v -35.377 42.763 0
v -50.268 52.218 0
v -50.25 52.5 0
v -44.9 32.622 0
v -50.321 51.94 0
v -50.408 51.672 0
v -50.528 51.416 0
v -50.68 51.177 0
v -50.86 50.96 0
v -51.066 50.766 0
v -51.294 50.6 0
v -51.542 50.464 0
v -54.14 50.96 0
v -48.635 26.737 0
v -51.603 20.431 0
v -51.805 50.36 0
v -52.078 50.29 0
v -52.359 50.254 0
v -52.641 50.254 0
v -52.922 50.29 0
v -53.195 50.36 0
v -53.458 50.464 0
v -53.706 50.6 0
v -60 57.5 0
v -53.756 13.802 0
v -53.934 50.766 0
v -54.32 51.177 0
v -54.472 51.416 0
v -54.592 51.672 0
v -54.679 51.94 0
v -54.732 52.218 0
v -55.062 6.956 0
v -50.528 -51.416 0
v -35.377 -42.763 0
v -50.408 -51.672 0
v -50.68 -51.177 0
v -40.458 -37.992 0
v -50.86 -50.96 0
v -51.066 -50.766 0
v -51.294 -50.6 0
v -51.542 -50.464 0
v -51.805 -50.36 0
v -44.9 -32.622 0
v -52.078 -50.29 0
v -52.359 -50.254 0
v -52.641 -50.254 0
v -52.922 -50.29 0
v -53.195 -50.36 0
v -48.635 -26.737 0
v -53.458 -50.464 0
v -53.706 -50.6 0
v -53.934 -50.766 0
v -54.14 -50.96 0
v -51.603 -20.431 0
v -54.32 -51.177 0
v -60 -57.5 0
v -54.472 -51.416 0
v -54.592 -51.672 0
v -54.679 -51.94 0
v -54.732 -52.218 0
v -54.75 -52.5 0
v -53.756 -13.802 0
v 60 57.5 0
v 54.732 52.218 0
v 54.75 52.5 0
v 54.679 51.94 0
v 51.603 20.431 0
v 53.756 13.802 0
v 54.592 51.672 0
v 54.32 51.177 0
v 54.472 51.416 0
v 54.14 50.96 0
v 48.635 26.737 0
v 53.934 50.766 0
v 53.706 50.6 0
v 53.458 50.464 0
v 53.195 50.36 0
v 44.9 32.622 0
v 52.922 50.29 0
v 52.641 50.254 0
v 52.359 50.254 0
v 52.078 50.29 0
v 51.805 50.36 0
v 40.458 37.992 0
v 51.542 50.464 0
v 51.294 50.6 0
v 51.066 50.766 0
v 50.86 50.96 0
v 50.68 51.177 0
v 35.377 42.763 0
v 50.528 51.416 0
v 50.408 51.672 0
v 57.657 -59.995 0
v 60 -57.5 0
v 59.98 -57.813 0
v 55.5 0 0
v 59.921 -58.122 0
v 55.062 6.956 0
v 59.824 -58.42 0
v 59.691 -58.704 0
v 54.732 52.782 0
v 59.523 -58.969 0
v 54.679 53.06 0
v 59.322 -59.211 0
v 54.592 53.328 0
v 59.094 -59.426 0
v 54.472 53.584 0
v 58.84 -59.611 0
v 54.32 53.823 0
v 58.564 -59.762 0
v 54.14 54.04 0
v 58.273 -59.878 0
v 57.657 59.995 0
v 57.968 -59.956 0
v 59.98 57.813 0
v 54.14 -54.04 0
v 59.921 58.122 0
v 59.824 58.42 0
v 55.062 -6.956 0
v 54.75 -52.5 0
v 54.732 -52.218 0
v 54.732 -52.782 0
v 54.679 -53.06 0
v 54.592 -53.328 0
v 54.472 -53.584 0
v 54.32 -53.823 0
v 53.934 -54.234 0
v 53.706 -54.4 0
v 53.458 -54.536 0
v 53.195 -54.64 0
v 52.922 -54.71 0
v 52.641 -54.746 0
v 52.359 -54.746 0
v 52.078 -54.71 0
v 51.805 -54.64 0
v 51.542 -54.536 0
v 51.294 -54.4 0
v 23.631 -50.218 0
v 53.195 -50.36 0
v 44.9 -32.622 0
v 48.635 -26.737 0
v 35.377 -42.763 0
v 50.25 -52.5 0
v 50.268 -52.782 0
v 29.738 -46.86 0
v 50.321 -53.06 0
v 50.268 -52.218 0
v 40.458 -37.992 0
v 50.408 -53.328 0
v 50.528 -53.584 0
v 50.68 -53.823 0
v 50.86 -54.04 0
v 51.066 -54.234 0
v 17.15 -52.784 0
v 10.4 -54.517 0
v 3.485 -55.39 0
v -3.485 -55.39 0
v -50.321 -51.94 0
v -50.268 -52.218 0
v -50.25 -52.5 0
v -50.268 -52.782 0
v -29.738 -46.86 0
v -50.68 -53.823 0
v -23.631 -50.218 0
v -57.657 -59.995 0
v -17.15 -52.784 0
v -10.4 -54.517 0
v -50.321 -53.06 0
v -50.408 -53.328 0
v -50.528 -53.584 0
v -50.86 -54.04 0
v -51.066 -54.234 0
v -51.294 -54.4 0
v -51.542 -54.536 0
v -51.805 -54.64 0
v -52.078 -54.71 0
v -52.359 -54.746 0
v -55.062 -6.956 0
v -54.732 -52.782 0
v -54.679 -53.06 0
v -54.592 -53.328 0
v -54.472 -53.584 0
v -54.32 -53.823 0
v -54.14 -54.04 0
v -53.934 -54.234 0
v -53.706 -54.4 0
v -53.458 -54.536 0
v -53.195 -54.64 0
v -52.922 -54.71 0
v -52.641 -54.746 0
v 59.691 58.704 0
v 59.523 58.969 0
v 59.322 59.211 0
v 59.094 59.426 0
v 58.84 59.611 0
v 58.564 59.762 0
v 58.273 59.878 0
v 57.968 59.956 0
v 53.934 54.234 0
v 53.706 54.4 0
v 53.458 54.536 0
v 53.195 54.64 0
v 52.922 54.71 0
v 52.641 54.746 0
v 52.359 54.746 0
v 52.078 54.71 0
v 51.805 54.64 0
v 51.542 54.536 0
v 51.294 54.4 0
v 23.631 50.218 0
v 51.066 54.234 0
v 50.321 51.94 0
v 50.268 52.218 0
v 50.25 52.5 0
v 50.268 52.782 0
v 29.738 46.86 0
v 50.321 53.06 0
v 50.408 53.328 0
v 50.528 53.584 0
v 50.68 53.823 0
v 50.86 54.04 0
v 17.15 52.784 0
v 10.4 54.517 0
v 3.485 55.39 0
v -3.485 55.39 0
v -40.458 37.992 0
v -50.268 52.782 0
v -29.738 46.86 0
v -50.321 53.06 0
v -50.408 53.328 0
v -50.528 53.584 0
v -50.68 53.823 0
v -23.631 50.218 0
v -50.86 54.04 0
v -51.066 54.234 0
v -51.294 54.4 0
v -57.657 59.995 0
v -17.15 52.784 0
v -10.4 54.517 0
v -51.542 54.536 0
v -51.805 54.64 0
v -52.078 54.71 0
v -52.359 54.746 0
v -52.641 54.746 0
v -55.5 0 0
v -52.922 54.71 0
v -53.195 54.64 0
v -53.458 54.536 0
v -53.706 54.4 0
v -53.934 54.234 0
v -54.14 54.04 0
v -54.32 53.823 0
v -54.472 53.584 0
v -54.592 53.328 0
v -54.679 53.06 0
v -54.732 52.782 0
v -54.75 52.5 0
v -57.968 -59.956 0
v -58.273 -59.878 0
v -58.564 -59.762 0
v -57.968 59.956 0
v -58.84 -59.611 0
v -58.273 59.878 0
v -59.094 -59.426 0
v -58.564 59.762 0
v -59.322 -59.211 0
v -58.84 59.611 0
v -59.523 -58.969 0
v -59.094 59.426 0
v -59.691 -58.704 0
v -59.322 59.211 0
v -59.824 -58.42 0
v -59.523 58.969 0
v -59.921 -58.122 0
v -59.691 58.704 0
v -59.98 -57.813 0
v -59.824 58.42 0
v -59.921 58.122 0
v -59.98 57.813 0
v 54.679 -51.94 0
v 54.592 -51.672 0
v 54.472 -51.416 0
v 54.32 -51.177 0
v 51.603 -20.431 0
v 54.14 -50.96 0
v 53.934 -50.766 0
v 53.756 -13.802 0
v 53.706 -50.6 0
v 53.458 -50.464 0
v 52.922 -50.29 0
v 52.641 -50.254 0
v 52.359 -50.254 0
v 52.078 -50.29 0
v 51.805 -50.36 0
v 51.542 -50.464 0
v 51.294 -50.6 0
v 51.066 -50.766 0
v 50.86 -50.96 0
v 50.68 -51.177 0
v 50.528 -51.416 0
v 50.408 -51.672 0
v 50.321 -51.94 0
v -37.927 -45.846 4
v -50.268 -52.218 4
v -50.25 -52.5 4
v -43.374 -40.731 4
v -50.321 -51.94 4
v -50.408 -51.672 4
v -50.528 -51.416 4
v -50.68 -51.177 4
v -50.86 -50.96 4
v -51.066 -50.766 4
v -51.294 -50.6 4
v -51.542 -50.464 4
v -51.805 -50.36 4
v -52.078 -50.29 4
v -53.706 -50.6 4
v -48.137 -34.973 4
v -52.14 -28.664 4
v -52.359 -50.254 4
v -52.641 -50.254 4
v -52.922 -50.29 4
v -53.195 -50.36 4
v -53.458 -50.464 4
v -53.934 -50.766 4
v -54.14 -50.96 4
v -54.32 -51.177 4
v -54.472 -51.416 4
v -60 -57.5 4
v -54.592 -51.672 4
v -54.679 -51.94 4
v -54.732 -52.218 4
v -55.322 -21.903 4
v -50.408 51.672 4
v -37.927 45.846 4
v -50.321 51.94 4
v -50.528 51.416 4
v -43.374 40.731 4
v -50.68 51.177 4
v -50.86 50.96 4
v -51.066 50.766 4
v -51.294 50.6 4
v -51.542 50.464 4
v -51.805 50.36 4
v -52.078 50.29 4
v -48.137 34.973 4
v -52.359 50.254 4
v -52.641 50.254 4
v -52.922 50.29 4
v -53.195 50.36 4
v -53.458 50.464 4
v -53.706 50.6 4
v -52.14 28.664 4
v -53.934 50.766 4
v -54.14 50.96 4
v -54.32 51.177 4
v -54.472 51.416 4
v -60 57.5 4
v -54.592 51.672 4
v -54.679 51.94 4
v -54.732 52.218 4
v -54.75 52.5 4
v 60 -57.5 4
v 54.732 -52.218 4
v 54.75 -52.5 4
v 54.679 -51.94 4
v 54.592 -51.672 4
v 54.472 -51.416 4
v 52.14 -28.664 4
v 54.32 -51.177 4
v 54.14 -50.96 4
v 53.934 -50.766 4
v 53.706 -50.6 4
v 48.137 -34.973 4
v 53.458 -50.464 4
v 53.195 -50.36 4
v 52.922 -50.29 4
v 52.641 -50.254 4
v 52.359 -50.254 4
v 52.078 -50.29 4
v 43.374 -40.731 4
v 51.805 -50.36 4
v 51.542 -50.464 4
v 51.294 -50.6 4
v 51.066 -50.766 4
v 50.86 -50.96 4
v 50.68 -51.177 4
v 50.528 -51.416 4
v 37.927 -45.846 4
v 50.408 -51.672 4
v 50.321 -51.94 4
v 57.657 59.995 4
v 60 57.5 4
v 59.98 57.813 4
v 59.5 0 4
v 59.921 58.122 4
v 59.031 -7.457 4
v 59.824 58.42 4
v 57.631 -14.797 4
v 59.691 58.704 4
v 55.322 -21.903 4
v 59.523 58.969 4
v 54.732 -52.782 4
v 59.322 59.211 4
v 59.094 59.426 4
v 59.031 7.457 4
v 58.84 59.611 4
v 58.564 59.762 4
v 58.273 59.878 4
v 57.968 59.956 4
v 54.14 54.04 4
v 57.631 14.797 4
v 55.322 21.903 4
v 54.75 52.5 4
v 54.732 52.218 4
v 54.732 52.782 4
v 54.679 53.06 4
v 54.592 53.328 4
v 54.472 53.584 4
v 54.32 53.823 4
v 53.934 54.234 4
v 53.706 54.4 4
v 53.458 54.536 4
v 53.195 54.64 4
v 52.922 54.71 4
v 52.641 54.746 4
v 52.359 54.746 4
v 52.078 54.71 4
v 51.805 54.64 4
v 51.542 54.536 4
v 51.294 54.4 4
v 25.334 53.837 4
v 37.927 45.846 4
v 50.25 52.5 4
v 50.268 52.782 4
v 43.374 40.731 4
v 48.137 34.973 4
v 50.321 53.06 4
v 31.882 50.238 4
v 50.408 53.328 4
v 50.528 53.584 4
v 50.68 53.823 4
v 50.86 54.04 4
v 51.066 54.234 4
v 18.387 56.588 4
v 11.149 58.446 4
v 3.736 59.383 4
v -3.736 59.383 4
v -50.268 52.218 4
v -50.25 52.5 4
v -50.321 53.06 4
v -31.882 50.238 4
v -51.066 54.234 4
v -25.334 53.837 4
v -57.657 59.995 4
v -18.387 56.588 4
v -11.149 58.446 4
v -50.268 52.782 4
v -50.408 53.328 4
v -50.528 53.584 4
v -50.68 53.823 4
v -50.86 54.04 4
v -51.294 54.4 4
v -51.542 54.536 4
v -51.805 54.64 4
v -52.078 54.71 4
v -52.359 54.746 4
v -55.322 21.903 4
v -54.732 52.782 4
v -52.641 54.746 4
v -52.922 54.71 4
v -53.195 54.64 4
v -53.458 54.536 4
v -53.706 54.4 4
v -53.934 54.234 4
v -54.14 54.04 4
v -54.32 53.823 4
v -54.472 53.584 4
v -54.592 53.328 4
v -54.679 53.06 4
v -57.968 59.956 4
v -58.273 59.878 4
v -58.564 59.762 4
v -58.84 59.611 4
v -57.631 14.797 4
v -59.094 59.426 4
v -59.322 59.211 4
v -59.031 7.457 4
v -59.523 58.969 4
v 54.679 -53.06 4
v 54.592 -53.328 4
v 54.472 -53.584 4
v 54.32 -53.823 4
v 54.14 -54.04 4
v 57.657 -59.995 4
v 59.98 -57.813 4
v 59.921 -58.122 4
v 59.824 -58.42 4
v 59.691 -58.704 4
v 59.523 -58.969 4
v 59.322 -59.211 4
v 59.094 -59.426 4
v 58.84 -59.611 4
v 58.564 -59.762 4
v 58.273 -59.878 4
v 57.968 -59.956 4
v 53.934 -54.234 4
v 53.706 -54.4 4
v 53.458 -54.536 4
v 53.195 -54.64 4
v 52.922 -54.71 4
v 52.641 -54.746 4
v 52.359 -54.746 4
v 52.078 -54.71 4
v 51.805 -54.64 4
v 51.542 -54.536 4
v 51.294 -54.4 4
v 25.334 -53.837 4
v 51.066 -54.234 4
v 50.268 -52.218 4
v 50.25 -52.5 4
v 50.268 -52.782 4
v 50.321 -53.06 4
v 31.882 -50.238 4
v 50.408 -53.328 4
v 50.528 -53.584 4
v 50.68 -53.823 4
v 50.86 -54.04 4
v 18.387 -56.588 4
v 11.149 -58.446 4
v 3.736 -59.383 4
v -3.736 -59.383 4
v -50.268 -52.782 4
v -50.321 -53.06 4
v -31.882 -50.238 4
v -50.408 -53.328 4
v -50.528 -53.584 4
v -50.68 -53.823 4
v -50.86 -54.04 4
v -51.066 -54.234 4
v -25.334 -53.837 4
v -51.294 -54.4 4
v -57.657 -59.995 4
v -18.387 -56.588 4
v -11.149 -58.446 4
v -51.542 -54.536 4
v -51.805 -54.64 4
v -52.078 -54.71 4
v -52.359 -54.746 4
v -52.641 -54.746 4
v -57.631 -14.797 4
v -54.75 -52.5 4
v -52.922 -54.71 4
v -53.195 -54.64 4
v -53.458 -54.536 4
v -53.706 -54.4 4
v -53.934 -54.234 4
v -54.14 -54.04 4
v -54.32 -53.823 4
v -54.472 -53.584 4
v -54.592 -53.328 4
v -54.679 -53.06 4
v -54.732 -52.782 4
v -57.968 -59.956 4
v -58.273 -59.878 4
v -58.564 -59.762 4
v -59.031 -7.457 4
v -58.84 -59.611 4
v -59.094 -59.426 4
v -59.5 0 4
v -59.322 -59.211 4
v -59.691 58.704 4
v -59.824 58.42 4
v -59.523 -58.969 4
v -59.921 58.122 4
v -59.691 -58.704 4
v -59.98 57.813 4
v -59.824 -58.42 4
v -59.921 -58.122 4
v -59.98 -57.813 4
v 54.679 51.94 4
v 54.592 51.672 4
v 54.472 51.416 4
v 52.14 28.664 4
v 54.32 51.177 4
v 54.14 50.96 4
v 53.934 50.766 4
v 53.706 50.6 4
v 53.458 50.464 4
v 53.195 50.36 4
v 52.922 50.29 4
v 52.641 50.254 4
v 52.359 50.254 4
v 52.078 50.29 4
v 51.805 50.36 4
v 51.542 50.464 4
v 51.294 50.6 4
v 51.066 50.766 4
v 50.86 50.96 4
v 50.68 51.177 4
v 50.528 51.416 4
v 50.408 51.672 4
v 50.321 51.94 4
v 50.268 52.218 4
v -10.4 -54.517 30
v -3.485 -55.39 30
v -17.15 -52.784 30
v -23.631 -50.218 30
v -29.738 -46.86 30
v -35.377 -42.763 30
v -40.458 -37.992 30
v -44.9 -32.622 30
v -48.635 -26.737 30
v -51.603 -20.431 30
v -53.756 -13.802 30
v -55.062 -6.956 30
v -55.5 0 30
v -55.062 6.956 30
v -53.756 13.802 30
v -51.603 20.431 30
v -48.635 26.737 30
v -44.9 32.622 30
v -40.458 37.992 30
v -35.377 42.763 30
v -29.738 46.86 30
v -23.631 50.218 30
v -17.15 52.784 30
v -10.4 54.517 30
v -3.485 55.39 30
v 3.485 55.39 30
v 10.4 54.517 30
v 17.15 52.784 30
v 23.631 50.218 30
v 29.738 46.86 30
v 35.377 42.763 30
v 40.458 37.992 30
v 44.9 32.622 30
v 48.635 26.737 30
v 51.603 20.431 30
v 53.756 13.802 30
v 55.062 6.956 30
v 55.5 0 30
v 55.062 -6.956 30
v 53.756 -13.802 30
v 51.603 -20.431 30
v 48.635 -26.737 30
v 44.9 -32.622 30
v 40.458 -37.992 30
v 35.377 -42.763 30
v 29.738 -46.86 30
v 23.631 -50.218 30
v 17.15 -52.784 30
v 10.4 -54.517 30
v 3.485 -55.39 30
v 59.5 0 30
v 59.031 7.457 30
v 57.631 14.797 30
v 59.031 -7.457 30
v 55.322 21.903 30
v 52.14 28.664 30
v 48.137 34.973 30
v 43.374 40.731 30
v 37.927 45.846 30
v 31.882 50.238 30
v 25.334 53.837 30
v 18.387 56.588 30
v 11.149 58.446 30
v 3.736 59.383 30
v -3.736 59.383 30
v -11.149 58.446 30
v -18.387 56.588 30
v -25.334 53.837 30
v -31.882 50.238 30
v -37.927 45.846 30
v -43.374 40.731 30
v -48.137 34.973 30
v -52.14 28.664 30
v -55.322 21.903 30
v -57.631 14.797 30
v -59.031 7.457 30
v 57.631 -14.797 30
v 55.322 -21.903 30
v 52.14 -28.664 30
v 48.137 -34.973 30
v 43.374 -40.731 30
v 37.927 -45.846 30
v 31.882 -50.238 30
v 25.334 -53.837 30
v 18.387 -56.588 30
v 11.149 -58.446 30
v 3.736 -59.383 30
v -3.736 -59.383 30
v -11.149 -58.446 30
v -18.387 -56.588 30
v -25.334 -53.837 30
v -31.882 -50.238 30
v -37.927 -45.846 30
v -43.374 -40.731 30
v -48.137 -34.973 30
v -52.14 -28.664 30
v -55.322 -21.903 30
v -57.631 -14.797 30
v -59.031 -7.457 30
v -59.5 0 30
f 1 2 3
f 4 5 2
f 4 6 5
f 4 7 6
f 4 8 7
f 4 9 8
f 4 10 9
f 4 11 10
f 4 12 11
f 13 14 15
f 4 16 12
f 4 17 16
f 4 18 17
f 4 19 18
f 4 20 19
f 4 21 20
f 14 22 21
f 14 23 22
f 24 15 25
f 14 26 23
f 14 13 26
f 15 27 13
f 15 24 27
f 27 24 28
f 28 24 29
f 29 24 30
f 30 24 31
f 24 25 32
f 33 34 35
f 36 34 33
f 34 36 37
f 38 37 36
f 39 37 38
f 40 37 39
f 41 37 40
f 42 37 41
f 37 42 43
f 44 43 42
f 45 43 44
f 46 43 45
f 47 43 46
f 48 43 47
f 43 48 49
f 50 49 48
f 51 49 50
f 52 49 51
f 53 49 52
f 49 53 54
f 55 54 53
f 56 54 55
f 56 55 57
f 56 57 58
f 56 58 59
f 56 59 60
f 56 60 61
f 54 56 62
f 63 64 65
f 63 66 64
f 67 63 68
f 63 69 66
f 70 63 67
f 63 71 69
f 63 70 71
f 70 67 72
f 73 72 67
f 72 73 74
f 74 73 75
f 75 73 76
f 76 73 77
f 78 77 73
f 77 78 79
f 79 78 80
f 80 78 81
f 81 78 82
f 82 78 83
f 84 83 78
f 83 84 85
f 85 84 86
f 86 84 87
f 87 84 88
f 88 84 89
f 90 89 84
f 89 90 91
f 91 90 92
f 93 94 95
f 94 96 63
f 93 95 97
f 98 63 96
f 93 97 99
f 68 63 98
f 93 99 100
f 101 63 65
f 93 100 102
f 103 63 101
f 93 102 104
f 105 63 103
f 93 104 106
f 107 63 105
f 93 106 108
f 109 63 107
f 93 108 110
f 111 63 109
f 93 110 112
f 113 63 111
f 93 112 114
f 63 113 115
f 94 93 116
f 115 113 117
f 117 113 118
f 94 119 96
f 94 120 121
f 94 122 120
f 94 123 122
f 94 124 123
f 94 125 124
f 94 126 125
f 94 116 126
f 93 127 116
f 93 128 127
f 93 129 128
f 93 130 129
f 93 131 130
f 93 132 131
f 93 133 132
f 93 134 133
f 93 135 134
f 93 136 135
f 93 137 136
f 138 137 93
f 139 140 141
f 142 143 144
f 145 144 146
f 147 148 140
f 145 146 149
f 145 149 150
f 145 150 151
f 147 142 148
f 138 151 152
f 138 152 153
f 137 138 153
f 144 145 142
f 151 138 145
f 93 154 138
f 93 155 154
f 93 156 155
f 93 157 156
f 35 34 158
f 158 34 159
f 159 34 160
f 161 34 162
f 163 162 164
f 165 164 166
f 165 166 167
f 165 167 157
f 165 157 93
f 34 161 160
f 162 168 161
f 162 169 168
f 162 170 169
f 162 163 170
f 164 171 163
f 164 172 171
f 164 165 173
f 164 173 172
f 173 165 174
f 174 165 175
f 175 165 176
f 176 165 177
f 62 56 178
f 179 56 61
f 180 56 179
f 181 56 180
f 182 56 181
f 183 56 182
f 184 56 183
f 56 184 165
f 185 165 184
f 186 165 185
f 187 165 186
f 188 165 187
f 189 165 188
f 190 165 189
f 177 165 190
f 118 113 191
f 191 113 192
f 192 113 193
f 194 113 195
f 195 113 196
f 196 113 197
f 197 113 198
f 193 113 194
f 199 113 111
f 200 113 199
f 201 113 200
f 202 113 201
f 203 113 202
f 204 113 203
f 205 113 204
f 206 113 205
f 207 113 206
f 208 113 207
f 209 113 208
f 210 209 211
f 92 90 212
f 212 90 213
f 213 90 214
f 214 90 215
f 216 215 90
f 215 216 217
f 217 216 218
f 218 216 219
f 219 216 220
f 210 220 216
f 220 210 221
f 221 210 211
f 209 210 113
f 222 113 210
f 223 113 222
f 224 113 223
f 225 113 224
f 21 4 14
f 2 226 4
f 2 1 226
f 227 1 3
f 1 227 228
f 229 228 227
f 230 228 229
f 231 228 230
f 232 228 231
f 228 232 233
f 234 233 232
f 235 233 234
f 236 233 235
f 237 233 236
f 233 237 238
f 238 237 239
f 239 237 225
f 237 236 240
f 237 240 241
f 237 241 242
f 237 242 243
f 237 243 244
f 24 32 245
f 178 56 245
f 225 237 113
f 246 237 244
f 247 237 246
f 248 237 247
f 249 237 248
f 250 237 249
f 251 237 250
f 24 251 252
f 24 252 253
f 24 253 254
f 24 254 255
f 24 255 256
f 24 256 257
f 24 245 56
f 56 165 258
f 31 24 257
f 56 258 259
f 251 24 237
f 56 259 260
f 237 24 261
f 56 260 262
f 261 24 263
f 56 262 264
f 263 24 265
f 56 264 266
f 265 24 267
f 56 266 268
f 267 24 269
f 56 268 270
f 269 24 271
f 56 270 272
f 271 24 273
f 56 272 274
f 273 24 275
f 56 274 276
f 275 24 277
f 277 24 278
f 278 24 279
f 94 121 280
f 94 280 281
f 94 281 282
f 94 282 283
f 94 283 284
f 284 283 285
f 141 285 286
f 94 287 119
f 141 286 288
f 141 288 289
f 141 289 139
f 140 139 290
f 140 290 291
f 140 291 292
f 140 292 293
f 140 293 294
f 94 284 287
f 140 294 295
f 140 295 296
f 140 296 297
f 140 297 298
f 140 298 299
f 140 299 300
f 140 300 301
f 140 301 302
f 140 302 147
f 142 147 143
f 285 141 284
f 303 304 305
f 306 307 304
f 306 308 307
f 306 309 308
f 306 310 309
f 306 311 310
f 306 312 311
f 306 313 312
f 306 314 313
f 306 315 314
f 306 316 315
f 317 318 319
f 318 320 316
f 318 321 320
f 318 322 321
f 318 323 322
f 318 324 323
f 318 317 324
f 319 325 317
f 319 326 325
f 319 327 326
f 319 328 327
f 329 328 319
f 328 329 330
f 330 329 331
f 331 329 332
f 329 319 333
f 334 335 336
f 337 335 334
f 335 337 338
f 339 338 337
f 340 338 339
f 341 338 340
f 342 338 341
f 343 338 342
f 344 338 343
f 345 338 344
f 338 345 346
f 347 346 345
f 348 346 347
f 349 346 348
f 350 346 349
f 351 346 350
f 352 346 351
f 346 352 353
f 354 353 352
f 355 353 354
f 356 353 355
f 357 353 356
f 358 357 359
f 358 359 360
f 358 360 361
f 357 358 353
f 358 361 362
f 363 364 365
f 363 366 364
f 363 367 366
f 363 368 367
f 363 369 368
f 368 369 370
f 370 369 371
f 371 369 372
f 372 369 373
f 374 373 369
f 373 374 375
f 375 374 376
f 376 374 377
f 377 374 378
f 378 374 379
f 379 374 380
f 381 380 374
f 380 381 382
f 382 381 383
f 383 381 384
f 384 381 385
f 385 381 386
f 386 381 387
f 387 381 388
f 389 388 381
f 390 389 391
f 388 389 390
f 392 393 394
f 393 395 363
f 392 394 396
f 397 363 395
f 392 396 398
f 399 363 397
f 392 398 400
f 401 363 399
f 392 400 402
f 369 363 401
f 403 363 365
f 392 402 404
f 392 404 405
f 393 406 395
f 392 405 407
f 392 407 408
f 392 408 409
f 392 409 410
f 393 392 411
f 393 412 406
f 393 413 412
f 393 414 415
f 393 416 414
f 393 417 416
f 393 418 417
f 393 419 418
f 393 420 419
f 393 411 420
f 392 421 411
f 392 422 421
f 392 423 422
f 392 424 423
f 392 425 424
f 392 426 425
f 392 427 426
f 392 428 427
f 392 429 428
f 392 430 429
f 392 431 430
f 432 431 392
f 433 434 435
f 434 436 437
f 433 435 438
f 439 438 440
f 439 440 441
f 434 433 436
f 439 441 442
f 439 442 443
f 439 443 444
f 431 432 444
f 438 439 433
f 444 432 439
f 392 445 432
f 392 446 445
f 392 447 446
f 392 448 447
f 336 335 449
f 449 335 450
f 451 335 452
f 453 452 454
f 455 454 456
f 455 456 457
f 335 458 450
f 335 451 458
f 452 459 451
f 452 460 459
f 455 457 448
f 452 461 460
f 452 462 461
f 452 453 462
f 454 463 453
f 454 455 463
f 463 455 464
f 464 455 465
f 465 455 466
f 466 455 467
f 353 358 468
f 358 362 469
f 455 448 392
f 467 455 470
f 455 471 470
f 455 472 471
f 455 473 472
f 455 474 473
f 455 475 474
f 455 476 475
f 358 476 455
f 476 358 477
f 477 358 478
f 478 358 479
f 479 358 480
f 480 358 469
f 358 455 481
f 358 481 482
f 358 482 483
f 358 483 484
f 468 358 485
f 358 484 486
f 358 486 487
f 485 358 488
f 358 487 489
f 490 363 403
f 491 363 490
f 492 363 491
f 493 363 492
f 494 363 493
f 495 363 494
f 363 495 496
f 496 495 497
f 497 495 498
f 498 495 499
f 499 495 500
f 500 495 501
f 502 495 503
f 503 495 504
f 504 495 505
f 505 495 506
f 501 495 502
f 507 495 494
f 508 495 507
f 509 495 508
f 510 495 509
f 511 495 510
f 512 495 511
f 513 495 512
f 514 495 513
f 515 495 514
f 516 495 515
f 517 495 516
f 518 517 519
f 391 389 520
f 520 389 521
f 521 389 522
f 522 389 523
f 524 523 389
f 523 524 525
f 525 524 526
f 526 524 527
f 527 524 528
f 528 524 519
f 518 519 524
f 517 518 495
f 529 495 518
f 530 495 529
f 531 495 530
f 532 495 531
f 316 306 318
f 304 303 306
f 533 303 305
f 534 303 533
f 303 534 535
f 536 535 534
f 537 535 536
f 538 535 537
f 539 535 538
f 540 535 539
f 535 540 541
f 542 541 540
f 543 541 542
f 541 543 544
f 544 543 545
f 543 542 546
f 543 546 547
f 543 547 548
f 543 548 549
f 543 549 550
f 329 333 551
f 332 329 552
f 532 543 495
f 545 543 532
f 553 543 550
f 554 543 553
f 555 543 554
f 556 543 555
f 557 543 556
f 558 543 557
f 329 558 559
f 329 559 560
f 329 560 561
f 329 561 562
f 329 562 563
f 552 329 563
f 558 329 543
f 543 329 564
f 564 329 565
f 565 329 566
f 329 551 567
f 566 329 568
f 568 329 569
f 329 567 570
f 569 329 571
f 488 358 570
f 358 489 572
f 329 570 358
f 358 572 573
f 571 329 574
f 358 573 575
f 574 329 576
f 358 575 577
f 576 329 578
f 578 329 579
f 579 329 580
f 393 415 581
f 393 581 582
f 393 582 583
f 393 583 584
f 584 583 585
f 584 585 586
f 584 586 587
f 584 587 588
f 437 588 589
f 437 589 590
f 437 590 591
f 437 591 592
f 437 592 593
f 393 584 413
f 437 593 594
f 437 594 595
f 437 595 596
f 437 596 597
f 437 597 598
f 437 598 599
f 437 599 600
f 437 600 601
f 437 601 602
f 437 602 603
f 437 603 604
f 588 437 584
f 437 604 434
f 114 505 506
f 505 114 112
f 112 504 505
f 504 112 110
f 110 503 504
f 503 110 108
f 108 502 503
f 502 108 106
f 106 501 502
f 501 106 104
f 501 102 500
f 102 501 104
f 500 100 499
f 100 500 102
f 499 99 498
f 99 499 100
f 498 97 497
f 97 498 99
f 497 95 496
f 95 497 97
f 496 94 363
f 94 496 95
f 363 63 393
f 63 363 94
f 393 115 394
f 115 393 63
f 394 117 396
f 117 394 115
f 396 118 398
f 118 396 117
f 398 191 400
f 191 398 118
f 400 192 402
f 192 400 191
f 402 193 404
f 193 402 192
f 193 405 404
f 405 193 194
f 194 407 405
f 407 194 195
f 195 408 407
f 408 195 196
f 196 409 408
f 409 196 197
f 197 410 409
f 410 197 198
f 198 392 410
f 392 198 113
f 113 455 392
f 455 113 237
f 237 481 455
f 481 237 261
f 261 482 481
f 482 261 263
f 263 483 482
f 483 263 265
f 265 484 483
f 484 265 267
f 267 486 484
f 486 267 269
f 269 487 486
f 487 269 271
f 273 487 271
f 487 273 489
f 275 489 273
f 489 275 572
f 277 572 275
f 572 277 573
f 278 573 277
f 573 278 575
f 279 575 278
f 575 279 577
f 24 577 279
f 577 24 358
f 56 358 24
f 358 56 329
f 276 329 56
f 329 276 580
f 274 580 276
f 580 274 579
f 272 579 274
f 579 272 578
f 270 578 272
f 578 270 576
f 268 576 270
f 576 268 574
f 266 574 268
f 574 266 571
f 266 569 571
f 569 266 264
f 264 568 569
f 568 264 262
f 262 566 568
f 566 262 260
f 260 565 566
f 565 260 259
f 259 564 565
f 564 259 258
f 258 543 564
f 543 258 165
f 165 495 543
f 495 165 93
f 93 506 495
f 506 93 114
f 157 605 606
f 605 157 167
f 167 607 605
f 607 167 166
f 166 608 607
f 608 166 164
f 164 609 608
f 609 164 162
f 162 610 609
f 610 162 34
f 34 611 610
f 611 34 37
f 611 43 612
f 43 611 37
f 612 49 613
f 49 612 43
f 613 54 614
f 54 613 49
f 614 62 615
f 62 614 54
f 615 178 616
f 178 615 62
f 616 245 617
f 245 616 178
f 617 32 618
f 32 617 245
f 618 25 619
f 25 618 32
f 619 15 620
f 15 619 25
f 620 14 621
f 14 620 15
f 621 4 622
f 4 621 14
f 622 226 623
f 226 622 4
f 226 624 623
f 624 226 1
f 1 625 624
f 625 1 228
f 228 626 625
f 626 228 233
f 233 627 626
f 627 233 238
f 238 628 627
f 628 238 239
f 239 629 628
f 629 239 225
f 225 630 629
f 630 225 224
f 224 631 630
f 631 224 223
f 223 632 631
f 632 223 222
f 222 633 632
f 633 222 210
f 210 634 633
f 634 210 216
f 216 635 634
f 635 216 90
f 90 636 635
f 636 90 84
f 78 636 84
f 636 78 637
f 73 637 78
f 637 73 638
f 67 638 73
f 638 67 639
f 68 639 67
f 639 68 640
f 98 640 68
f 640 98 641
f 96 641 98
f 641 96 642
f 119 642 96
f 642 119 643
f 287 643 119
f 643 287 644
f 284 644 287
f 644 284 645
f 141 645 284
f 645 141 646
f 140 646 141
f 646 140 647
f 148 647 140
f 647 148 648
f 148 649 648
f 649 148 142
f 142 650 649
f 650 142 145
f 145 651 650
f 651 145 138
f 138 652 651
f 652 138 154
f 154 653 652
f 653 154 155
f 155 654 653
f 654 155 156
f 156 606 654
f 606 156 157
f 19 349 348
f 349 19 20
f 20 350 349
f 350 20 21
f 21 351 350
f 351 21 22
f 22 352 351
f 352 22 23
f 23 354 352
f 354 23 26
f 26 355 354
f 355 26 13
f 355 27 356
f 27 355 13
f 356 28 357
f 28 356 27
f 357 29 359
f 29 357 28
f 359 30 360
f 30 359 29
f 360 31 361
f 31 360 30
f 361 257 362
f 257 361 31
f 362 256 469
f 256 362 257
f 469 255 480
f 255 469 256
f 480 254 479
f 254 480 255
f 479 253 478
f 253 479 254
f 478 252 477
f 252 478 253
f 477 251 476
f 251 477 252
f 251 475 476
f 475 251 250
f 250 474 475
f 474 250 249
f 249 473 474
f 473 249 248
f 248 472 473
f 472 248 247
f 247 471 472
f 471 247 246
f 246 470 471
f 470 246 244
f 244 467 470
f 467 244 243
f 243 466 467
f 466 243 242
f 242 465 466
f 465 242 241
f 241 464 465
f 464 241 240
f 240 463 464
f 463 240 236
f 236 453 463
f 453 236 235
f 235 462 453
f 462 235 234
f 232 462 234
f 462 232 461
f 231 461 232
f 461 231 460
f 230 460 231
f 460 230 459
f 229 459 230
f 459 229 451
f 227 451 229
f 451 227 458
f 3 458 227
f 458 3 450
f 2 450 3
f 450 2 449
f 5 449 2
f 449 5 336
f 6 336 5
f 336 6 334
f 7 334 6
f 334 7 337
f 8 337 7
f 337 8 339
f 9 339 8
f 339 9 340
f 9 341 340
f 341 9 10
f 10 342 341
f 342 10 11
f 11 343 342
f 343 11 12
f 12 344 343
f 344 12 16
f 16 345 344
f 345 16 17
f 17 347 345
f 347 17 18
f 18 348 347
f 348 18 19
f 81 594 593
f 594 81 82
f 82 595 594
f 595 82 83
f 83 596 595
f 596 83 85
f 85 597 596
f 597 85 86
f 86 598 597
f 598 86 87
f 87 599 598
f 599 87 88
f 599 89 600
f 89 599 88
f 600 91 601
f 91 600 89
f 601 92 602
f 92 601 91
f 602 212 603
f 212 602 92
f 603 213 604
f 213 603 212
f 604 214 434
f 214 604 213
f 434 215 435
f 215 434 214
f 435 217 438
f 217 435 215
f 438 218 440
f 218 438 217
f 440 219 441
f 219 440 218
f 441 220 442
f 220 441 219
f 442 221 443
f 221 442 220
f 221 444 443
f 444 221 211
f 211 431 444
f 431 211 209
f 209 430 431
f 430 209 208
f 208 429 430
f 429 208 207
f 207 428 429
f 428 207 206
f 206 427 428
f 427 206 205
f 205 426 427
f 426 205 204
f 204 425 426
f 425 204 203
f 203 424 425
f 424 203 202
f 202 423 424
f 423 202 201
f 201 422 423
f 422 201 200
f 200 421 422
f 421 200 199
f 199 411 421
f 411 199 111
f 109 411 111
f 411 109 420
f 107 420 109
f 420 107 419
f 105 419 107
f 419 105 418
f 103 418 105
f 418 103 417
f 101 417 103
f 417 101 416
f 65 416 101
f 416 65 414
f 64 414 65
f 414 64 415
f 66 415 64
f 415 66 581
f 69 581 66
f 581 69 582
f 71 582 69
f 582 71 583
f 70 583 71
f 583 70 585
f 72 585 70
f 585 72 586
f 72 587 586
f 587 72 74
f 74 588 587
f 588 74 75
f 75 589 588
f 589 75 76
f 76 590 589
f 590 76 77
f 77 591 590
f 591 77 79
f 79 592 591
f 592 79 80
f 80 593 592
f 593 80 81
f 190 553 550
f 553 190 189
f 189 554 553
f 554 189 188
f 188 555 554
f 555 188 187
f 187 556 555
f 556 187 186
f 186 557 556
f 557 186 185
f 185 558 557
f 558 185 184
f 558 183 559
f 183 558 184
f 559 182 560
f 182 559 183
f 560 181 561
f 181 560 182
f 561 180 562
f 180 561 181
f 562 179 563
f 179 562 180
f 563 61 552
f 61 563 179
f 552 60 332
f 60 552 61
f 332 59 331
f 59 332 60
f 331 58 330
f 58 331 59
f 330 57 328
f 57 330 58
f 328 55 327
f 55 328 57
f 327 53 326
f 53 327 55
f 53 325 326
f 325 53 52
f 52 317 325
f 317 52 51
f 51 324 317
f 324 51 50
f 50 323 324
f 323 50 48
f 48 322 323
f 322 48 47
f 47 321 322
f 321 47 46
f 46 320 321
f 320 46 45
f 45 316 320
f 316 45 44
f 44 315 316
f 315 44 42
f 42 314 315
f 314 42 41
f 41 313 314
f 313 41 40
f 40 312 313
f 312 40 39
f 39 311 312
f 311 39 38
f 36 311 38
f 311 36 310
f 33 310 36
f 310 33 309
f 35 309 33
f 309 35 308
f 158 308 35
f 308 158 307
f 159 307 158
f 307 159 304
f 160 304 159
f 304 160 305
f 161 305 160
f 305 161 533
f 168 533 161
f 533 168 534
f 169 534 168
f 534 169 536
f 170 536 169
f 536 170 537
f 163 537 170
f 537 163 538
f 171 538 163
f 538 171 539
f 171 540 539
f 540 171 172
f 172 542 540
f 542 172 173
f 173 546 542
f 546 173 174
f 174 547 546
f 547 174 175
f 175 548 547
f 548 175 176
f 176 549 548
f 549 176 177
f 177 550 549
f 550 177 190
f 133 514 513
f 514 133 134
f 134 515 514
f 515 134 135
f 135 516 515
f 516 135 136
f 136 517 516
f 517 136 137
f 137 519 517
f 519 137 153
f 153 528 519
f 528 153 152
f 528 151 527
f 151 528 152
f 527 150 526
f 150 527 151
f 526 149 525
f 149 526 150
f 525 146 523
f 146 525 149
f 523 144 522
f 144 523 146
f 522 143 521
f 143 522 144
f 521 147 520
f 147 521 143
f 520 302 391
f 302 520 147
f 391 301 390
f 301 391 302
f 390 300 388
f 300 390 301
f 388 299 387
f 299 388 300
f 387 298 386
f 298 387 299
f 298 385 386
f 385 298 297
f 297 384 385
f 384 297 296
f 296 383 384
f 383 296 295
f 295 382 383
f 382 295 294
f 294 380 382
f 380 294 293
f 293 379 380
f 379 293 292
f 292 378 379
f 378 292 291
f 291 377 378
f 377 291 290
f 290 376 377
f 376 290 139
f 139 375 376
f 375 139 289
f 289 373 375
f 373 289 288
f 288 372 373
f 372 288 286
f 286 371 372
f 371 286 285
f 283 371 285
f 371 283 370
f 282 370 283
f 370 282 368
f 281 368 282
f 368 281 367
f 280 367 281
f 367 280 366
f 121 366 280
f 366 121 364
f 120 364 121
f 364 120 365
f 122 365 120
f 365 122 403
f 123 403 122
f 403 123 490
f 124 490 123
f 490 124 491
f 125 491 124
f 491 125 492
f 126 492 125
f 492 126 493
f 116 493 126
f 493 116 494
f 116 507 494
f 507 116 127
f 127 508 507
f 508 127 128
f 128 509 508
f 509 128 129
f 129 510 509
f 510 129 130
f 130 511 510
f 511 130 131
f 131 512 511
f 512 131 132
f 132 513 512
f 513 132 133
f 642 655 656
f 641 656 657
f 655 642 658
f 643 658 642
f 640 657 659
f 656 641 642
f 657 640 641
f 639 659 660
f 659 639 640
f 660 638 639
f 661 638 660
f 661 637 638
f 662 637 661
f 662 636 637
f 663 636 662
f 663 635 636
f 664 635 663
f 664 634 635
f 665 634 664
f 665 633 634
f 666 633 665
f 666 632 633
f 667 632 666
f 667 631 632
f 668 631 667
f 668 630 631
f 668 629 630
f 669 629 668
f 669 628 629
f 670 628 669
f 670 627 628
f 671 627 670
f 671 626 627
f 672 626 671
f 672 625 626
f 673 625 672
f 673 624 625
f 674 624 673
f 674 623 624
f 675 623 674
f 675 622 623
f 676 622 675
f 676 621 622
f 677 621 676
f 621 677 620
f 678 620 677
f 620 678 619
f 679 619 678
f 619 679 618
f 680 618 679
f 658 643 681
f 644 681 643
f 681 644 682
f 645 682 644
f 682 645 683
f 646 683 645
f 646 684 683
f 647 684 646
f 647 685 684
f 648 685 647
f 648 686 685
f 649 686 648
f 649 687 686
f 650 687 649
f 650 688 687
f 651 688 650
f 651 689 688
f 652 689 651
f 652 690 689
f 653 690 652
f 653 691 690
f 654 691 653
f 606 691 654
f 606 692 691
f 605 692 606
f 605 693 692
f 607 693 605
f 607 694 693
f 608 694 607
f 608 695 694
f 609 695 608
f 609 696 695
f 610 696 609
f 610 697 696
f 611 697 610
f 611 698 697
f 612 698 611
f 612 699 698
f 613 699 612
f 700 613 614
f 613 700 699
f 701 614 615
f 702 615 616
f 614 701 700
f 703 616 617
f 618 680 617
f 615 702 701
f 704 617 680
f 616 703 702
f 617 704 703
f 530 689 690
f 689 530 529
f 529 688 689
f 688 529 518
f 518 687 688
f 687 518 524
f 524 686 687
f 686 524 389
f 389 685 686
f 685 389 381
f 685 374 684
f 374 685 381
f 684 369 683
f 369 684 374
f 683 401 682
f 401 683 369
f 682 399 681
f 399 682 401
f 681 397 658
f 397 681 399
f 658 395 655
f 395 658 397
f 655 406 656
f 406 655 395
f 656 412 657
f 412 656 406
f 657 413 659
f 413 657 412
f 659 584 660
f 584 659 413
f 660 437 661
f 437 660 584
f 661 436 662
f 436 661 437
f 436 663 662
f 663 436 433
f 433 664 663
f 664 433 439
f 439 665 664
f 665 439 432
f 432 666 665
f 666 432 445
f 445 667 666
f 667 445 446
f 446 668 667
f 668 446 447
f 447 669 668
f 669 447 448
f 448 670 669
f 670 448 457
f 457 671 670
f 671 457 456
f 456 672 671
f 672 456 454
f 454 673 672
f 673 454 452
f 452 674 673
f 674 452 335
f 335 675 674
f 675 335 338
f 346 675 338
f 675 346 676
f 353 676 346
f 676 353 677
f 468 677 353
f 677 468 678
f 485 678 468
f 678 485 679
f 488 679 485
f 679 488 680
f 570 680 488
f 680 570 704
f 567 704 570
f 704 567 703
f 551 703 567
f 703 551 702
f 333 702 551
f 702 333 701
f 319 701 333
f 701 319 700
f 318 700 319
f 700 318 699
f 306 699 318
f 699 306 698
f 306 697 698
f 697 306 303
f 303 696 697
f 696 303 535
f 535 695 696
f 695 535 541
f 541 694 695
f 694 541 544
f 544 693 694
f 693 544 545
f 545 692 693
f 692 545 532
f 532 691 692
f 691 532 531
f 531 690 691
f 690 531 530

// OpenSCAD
$fn = 50;

fanPlatform = 120;
platformHeight = 4;
ScrewHolesDist = 105;
outerIntake = 111; //add one for a bit more space to get it on
height = 30;
screwHoles = 4.5;

screwPosition = (ScrewHolesDist)/2;


linear_extrude(platformHeight)
    difference() {
        roundedSquare(fanPlatform, 5);
        circle(d=outerIntake);
        
        for( x = [-1, 1])
        for( y = [-1, 1])
        translate([x*screwPosition,y*screwPosition,0])
            circle(d=screwHoles);
    };

module roundedSquare(size, diameter) {
    minkowski(){    
        square(size-diameter, center = true);
        circle(d=diameter);
    }
}

linear_extrude(height)
    difference() {
        circle(d=outerIntake+platformHeight*2);
        circle(d=outerIntake);
    };
